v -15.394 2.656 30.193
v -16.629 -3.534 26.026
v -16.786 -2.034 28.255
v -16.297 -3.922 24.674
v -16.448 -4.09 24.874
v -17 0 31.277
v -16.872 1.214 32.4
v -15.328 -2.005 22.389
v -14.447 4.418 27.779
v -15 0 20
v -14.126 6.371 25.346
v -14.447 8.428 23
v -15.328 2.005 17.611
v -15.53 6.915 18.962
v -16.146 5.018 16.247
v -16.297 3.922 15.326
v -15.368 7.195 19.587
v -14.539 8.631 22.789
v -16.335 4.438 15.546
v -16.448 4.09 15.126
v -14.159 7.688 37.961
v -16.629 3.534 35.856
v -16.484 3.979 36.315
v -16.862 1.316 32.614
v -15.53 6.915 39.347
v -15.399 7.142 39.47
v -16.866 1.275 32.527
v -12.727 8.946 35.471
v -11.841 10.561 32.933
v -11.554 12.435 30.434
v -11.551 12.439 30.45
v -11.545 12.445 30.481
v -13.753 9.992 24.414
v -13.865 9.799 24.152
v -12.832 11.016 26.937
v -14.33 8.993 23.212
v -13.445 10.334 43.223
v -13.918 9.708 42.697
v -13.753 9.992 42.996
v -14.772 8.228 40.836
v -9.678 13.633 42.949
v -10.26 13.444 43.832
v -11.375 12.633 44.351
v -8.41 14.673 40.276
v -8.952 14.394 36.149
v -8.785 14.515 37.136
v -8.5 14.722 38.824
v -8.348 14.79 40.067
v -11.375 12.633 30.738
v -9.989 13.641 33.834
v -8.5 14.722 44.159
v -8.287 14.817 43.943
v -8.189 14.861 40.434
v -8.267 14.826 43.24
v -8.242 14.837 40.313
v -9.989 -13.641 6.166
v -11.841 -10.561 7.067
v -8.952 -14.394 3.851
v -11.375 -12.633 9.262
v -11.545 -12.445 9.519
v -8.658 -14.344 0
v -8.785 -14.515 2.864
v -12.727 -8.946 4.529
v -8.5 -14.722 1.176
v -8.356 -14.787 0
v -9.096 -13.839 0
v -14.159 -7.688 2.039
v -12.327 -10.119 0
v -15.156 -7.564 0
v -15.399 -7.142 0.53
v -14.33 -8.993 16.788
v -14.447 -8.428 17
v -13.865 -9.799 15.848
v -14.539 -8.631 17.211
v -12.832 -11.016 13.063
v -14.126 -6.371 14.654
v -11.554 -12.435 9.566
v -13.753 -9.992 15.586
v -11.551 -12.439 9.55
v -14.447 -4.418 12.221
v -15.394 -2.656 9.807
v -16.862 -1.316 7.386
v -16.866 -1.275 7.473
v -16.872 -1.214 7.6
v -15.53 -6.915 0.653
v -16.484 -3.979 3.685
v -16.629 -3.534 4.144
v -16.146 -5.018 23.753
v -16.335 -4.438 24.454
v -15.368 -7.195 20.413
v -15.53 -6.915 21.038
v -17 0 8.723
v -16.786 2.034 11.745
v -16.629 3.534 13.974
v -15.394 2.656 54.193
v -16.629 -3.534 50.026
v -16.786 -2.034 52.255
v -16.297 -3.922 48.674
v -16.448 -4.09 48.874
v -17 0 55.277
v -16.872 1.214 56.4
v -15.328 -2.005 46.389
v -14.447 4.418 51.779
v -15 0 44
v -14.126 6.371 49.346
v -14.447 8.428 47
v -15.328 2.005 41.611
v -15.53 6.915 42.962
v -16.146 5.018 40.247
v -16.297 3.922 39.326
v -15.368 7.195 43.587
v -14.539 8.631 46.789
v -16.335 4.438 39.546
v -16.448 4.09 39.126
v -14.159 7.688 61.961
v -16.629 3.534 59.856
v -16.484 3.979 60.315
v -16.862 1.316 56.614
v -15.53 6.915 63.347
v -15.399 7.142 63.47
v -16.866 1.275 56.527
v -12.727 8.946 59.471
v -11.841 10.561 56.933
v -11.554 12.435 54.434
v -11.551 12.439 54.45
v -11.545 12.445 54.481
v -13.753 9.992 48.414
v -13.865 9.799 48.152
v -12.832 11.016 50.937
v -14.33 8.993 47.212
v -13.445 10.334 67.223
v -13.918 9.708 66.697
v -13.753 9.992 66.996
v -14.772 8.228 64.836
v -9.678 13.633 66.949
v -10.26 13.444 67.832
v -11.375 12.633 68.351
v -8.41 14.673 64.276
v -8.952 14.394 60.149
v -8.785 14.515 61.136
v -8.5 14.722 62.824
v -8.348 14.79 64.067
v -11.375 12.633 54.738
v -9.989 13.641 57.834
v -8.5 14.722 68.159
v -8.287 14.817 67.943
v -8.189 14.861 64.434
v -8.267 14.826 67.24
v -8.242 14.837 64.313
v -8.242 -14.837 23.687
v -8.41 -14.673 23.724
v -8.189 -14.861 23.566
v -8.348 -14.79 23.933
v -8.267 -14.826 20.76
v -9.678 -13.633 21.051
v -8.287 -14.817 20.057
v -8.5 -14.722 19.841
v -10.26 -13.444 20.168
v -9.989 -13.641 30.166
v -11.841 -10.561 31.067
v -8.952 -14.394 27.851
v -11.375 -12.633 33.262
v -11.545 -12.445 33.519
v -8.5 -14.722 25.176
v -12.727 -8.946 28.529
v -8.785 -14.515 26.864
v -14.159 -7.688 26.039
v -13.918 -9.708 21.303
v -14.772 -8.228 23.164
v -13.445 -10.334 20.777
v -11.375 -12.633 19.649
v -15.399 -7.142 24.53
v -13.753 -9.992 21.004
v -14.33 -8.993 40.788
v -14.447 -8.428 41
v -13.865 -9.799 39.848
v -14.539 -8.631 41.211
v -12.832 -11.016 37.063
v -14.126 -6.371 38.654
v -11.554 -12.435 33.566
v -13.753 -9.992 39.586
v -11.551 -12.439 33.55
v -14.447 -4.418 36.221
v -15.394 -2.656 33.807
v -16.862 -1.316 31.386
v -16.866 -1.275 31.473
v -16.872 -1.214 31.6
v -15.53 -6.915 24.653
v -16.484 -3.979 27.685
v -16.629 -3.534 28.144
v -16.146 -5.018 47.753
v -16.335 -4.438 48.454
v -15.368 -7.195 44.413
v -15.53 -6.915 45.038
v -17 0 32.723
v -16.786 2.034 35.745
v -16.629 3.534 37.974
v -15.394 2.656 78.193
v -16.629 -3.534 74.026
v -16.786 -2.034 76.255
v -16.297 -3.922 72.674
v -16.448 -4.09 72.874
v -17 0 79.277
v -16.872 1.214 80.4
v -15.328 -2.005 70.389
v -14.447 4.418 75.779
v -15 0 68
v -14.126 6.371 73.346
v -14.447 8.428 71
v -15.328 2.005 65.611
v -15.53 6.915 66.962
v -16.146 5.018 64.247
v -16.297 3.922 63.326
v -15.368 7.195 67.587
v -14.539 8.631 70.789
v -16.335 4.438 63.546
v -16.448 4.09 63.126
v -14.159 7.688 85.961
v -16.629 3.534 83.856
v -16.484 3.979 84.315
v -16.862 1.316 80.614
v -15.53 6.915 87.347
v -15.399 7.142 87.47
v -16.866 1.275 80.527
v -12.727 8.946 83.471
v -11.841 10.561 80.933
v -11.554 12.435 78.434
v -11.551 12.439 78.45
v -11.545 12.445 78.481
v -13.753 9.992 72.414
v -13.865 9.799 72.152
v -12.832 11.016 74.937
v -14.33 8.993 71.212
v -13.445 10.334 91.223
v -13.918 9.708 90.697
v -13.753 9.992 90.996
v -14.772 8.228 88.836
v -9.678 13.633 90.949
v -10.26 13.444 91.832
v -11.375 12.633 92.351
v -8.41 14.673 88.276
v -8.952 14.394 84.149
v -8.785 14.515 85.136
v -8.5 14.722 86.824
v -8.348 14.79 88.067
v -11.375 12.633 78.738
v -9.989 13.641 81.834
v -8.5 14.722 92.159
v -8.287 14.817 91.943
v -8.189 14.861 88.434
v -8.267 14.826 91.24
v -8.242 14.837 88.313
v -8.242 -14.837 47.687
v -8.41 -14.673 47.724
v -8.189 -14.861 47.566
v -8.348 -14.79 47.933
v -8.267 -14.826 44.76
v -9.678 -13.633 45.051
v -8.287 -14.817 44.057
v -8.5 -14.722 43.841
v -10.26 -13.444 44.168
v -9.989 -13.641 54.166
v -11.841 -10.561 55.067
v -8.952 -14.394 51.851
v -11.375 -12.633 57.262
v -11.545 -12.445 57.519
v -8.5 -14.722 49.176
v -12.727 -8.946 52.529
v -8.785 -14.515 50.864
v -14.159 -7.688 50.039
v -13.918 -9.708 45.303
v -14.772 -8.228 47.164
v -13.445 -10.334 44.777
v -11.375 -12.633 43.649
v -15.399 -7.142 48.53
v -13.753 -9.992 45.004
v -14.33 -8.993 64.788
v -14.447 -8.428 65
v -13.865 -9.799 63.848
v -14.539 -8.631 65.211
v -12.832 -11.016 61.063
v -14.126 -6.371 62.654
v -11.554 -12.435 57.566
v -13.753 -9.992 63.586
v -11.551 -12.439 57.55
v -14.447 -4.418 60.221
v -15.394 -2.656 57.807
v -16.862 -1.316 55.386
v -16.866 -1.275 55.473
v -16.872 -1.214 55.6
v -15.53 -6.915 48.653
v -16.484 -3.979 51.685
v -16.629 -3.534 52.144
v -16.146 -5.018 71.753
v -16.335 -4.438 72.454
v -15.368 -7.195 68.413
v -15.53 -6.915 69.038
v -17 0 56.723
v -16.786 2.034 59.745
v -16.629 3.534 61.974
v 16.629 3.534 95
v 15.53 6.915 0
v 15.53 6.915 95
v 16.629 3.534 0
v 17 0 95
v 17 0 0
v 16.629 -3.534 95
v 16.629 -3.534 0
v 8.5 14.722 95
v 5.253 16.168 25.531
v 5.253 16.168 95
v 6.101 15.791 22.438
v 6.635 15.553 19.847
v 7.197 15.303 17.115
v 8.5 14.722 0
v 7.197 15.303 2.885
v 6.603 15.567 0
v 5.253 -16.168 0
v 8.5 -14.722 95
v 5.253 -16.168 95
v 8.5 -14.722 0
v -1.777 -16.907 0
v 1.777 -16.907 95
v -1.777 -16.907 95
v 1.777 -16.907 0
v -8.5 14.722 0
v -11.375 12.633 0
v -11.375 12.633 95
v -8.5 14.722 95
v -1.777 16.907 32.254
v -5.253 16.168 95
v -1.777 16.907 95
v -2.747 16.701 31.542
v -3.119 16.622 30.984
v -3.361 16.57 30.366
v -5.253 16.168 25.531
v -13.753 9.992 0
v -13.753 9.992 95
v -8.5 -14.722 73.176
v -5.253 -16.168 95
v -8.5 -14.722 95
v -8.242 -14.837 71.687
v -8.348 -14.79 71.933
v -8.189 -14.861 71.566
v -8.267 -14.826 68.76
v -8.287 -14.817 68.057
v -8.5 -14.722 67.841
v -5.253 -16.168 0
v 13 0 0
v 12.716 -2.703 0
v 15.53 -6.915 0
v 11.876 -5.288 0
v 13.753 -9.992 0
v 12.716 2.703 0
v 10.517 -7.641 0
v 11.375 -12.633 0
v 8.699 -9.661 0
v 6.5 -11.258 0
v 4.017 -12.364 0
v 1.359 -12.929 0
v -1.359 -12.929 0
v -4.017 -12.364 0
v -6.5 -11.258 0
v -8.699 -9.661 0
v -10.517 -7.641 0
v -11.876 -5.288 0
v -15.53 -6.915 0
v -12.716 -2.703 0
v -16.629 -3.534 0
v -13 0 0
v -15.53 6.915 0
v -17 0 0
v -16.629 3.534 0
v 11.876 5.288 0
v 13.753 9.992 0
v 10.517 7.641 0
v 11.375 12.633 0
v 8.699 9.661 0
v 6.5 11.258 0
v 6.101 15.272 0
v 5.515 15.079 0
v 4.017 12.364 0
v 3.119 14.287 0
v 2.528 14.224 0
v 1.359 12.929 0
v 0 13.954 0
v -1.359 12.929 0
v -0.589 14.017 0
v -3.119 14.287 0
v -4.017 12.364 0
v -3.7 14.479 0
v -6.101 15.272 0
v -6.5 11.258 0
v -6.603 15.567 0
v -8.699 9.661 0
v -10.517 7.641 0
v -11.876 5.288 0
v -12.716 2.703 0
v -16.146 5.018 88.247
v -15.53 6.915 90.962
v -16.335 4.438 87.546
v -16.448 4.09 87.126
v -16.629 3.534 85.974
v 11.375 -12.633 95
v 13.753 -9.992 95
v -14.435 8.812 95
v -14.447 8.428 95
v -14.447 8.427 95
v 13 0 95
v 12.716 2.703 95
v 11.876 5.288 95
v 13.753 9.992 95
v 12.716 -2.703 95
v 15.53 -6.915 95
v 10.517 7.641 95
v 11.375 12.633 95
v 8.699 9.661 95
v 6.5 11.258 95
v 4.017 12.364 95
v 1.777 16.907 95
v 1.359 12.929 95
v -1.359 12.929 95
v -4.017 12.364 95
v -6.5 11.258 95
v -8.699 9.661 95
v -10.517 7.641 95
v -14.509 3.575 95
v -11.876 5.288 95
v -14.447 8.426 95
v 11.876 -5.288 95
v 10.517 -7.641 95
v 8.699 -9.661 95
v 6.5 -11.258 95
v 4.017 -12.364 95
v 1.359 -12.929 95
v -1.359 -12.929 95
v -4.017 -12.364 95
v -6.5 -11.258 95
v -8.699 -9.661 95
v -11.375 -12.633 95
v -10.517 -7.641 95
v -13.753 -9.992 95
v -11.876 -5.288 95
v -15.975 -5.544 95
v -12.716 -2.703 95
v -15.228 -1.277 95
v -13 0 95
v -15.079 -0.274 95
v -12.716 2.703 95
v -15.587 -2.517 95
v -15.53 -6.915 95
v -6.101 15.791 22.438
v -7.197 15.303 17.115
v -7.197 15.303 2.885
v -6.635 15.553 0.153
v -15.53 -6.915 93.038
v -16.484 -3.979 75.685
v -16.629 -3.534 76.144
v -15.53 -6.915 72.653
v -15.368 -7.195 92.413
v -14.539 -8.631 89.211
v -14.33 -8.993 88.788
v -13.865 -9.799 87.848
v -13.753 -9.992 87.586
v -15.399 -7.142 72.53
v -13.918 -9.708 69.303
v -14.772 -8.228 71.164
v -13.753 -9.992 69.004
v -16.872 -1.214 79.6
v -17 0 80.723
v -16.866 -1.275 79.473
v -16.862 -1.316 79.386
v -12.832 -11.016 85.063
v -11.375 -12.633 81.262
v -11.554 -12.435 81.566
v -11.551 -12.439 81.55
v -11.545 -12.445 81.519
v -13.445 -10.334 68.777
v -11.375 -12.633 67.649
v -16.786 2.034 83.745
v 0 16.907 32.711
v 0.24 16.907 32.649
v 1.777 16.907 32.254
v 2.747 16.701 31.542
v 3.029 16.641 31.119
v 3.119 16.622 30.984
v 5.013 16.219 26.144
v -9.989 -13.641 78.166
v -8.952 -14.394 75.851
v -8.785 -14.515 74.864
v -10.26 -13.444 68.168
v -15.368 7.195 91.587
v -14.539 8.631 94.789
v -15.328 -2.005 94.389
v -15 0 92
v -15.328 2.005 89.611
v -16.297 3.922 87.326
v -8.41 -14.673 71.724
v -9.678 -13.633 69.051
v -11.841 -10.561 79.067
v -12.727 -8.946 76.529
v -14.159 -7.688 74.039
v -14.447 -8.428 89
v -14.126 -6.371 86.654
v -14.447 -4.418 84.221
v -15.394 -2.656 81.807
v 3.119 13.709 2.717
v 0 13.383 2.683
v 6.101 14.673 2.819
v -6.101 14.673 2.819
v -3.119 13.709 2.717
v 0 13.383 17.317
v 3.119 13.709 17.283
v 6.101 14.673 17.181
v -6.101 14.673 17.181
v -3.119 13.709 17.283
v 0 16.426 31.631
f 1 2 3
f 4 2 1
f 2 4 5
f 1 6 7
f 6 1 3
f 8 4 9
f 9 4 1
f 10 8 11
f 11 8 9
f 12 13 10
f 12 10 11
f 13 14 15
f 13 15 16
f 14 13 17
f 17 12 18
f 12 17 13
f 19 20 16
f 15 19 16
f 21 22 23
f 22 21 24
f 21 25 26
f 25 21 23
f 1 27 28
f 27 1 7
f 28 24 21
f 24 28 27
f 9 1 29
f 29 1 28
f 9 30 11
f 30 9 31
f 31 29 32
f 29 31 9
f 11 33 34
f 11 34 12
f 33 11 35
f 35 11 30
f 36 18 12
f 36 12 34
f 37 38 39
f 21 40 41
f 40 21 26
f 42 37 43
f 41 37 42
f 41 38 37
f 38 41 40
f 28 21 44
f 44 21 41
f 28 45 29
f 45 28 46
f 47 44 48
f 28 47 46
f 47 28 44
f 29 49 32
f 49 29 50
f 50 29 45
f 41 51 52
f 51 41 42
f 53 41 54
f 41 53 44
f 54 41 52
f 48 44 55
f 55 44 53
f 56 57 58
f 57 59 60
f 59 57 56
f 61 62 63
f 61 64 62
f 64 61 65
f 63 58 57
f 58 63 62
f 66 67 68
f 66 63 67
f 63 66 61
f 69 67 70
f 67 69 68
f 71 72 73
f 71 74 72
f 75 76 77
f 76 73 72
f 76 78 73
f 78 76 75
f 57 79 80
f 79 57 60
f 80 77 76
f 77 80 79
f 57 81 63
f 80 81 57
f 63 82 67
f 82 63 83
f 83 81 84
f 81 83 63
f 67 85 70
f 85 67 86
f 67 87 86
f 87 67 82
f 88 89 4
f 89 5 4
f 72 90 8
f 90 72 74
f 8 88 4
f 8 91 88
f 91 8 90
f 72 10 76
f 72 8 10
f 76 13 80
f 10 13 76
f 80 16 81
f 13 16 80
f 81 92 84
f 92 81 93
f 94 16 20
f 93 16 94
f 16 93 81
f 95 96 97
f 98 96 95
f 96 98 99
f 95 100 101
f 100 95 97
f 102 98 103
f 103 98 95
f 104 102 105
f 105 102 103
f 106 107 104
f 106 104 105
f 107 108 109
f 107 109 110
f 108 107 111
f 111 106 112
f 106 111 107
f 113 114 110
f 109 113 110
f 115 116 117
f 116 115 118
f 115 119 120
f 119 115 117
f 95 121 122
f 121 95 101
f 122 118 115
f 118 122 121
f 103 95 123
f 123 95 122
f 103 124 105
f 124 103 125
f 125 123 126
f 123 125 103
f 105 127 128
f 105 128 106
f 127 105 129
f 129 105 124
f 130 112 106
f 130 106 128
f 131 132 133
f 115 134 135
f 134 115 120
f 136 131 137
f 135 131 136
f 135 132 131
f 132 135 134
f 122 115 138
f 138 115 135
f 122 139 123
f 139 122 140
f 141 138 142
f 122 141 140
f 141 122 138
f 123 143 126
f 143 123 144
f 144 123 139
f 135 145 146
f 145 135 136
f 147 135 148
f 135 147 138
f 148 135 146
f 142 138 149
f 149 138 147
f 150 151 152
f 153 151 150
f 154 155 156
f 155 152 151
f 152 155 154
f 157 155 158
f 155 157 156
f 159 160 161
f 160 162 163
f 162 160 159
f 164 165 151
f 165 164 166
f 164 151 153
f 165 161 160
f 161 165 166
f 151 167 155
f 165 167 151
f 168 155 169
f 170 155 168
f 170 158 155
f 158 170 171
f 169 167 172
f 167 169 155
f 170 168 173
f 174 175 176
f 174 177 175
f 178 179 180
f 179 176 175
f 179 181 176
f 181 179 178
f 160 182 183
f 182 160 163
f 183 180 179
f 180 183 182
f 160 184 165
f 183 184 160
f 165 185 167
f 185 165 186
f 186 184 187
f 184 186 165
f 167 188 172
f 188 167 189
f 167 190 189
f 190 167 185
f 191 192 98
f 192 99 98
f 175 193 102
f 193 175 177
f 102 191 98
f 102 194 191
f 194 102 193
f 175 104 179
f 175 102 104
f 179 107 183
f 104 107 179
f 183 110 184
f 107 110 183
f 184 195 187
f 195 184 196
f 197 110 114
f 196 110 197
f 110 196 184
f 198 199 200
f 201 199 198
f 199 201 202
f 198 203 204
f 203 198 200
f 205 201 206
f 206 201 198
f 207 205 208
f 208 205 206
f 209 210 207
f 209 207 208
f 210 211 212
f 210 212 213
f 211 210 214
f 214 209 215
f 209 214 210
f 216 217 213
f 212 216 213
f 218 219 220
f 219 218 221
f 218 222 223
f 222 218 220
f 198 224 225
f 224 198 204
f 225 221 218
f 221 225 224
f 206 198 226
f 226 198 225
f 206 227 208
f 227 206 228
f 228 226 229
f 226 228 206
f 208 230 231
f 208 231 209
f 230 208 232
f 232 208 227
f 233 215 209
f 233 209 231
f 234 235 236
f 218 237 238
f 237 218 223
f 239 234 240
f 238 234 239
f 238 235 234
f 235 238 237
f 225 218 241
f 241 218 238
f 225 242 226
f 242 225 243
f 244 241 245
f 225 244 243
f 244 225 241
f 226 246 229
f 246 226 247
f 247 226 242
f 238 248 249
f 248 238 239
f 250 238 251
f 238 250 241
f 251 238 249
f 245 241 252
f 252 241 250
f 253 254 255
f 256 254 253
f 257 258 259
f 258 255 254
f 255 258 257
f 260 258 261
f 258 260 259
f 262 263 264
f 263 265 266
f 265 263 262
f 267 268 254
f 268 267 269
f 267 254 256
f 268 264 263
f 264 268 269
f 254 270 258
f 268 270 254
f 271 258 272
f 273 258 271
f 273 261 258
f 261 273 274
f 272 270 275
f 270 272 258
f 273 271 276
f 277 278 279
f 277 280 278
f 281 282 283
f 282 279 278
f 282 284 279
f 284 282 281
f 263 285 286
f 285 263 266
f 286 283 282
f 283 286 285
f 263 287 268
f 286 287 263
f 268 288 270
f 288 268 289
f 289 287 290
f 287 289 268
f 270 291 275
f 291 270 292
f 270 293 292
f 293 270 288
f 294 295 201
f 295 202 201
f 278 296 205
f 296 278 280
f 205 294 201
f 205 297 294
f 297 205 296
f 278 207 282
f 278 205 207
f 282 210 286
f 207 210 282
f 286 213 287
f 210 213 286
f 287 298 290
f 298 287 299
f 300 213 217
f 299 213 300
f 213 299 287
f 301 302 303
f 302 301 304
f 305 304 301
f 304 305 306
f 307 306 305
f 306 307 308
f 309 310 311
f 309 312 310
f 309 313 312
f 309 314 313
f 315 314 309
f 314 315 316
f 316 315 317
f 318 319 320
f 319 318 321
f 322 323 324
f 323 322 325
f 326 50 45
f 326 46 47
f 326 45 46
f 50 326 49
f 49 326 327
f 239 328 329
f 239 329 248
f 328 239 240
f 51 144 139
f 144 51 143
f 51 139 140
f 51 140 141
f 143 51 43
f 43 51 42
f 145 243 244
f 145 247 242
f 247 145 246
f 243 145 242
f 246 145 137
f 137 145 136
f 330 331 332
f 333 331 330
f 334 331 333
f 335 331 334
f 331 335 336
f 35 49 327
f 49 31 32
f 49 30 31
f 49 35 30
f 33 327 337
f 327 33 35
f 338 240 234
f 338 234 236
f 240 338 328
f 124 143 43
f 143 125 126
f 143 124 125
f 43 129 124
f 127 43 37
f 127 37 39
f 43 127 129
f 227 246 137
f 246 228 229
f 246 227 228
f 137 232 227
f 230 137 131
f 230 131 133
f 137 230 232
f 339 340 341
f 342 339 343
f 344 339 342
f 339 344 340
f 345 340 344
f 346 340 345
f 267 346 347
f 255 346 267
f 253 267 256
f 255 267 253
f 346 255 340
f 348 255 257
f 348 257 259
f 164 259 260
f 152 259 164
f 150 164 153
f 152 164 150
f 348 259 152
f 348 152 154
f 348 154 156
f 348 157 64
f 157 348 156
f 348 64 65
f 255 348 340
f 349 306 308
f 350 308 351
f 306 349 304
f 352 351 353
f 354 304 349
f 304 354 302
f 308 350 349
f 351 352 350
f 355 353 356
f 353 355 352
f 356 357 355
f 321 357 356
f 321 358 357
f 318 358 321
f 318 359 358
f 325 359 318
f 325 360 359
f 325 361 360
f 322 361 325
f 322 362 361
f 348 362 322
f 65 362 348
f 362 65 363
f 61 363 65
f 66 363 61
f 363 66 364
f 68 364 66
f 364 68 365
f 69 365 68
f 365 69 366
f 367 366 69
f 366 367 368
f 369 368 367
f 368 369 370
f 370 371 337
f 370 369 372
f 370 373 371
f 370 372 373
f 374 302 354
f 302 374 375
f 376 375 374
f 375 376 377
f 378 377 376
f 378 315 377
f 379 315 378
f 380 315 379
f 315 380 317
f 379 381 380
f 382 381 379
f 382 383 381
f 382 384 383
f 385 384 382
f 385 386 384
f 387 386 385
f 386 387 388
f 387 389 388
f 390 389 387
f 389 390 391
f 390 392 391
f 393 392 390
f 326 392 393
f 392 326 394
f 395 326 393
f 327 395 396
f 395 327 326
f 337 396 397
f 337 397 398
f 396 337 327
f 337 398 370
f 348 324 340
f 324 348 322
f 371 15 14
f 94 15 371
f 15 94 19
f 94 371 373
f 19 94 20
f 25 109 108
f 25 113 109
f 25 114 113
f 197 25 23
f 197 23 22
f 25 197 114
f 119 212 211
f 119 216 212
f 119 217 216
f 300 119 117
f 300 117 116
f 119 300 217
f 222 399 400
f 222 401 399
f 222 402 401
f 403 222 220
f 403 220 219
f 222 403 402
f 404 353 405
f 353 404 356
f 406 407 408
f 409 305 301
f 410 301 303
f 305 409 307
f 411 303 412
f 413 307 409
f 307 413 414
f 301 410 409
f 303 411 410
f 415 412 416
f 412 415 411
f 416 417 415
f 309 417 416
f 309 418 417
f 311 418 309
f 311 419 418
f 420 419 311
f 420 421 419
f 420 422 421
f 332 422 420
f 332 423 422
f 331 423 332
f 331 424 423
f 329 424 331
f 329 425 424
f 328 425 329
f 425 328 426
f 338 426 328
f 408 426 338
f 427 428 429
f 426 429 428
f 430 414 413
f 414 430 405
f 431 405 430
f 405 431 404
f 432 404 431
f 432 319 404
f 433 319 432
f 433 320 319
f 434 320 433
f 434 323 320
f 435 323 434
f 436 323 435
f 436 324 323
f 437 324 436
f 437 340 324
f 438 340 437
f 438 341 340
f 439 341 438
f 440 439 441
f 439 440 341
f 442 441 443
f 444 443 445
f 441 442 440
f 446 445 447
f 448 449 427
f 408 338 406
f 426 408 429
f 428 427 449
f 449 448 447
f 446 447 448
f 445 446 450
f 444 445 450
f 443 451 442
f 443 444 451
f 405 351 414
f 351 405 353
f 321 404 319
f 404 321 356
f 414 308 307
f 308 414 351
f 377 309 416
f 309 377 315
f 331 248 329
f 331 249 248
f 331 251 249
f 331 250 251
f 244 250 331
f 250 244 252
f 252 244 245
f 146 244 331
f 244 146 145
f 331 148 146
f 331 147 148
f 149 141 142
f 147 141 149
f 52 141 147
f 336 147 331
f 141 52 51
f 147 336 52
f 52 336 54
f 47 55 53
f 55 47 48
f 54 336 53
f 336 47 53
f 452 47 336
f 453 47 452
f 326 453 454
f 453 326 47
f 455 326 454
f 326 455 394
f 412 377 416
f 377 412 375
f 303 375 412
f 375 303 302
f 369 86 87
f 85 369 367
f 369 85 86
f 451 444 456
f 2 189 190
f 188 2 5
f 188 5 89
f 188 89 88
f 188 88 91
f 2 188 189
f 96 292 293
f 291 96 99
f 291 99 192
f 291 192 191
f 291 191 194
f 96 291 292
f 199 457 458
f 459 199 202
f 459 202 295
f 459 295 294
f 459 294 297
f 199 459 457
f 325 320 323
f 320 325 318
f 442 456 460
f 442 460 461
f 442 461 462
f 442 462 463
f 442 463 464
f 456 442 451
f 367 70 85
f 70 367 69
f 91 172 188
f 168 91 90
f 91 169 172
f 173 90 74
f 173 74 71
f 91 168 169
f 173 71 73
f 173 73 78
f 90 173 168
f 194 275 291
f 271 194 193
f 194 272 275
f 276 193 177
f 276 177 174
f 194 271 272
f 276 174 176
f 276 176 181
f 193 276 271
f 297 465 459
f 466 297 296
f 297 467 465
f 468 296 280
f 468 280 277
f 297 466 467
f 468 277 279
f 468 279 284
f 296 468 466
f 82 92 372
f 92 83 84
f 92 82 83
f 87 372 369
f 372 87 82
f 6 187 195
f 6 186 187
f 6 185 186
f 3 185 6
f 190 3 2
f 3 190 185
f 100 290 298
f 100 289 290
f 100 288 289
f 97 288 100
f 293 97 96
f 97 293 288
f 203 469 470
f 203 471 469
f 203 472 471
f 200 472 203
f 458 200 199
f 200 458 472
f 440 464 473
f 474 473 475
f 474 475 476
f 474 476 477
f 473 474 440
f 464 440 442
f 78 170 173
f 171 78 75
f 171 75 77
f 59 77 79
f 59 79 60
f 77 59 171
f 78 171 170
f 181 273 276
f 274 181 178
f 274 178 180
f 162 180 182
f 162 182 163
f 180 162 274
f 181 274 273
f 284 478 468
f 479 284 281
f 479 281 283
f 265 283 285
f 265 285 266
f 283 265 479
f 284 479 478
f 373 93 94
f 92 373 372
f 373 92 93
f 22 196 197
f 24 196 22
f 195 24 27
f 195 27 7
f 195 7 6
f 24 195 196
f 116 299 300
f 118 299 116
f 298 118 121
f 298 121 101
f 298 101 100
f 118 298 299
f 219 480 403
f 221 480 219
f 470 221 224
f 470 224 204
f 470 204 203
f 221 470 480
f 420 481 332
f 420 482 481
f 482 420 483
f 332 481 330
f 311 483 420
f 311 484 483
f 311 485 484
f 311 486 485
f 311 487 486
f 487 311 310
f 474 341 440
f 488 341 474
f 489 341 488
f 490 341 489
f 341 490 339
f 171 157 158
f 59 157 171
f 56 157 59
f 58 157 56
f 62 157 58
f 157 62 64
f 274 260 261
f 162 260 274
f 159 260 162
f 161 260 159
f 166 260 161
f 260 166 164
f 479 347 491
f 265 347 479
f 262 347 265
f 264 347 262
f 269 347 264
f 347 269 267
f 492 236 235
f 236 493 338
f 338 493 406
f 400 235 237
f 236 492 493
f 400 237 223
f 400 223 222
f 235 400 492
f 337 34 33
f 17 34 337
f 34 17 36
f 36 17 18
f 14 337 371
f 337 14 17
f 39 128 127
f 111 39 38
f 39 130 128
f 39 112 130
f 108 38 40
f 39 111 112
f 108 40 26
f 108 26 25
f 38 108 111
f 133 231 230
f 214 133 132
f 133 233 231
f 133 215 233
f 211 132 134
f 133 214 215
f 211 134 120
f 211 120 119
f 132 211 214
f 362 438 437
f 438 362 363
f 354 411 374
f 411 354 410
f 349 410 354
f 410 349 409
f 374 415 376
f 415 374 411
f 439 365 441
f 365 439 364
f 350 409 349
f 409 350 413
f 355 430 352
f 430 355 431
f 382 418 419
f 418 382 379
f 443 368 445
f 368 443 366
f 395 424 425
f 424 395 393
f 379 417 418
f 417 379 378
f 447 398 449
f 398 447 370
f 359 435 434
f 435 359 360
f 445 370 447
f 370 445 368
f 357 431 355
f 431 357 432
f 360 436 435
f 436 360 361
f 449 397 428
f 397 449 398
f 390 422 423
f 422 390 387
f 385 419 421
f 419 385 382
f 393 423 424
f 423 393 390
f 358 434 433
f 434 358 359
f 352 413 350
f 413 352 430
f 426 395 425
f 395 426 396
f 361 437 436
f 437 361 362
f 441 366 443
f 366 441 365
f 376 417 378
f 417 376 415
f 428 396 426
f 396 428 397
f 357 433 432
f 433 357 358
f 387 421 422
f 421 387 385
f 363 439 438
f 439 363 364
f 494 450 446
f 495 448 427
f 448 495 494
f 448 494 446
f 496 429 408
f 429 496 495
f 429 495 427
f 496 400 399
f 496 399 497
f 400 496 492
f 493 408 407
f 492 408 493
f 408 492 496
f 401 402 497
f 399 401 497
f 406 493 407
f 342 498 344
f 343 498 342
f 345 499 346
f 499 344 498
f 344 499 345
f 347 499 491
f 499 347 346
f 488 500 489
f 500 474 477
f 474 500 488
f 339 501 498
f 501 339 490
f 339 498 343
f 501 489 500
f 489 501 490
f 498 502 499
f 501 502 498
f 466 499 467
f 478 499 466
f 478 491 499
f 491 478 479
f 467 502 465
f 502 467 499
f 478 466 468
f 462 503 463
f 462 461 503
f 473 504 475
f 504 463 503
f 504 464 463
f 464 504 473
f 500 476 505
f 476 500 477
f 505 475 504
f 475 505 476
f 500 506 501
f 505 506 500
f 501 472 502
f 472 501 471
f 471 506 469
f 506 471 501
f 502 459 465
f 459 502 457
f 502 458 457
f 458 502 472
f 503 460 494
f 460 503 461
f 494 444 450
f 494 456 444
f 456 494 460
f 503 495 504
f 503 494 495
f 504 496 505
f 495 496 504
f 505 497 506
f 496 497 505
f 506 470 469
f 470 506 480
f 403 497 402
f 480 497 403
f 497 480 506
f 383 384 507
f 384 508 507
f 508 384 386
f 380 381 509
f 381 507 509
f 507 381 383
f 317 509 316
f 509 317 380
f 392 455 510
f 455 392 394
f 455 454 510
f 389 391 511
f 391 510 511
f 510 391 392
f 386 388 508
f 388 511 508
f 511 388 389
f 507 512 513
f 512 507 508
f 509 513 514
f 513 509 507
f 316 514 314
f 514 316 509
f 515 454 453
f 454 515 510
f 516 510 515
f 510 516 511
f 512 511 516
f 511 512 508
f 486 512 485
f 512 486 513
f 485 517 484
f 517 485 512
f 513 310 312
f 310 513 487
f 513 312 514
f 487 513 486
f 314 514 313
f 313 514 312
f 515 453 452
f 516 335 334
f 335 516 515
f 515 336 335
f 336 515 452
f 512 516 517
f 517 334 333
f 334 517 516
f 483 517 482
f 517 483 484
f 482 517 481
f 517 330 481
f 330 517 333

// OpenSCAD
bar_r = 11;
grip_r = 17;
grip_l = 95;
//$fn = 200;

grip();

module finger(size) {
    rotate_extrude(convexity = 10)
    translate([55, 0, 0])
    circle(r = size);
}

module grip() {
//    minkowski()
 //   {
        difference(){
            cylinder(  grip_l,   grip_r, grip_r);
            cylinder(  grip_l,   bar_r+2, bar_r+2);
            for (f =[20:24:70]) translate([25, 0, f]) rotate([40,0,0]) finger(15);
            translate([25, 0, 92]) rotate([40,0,0]) finger(15);
            translate([0, 83, 10]) rotate([0,90,0]) finger(15);
//            translate([0, 3, 7]) finger(10);
        };
 //       sphere(r = 2);
 //   };
}
